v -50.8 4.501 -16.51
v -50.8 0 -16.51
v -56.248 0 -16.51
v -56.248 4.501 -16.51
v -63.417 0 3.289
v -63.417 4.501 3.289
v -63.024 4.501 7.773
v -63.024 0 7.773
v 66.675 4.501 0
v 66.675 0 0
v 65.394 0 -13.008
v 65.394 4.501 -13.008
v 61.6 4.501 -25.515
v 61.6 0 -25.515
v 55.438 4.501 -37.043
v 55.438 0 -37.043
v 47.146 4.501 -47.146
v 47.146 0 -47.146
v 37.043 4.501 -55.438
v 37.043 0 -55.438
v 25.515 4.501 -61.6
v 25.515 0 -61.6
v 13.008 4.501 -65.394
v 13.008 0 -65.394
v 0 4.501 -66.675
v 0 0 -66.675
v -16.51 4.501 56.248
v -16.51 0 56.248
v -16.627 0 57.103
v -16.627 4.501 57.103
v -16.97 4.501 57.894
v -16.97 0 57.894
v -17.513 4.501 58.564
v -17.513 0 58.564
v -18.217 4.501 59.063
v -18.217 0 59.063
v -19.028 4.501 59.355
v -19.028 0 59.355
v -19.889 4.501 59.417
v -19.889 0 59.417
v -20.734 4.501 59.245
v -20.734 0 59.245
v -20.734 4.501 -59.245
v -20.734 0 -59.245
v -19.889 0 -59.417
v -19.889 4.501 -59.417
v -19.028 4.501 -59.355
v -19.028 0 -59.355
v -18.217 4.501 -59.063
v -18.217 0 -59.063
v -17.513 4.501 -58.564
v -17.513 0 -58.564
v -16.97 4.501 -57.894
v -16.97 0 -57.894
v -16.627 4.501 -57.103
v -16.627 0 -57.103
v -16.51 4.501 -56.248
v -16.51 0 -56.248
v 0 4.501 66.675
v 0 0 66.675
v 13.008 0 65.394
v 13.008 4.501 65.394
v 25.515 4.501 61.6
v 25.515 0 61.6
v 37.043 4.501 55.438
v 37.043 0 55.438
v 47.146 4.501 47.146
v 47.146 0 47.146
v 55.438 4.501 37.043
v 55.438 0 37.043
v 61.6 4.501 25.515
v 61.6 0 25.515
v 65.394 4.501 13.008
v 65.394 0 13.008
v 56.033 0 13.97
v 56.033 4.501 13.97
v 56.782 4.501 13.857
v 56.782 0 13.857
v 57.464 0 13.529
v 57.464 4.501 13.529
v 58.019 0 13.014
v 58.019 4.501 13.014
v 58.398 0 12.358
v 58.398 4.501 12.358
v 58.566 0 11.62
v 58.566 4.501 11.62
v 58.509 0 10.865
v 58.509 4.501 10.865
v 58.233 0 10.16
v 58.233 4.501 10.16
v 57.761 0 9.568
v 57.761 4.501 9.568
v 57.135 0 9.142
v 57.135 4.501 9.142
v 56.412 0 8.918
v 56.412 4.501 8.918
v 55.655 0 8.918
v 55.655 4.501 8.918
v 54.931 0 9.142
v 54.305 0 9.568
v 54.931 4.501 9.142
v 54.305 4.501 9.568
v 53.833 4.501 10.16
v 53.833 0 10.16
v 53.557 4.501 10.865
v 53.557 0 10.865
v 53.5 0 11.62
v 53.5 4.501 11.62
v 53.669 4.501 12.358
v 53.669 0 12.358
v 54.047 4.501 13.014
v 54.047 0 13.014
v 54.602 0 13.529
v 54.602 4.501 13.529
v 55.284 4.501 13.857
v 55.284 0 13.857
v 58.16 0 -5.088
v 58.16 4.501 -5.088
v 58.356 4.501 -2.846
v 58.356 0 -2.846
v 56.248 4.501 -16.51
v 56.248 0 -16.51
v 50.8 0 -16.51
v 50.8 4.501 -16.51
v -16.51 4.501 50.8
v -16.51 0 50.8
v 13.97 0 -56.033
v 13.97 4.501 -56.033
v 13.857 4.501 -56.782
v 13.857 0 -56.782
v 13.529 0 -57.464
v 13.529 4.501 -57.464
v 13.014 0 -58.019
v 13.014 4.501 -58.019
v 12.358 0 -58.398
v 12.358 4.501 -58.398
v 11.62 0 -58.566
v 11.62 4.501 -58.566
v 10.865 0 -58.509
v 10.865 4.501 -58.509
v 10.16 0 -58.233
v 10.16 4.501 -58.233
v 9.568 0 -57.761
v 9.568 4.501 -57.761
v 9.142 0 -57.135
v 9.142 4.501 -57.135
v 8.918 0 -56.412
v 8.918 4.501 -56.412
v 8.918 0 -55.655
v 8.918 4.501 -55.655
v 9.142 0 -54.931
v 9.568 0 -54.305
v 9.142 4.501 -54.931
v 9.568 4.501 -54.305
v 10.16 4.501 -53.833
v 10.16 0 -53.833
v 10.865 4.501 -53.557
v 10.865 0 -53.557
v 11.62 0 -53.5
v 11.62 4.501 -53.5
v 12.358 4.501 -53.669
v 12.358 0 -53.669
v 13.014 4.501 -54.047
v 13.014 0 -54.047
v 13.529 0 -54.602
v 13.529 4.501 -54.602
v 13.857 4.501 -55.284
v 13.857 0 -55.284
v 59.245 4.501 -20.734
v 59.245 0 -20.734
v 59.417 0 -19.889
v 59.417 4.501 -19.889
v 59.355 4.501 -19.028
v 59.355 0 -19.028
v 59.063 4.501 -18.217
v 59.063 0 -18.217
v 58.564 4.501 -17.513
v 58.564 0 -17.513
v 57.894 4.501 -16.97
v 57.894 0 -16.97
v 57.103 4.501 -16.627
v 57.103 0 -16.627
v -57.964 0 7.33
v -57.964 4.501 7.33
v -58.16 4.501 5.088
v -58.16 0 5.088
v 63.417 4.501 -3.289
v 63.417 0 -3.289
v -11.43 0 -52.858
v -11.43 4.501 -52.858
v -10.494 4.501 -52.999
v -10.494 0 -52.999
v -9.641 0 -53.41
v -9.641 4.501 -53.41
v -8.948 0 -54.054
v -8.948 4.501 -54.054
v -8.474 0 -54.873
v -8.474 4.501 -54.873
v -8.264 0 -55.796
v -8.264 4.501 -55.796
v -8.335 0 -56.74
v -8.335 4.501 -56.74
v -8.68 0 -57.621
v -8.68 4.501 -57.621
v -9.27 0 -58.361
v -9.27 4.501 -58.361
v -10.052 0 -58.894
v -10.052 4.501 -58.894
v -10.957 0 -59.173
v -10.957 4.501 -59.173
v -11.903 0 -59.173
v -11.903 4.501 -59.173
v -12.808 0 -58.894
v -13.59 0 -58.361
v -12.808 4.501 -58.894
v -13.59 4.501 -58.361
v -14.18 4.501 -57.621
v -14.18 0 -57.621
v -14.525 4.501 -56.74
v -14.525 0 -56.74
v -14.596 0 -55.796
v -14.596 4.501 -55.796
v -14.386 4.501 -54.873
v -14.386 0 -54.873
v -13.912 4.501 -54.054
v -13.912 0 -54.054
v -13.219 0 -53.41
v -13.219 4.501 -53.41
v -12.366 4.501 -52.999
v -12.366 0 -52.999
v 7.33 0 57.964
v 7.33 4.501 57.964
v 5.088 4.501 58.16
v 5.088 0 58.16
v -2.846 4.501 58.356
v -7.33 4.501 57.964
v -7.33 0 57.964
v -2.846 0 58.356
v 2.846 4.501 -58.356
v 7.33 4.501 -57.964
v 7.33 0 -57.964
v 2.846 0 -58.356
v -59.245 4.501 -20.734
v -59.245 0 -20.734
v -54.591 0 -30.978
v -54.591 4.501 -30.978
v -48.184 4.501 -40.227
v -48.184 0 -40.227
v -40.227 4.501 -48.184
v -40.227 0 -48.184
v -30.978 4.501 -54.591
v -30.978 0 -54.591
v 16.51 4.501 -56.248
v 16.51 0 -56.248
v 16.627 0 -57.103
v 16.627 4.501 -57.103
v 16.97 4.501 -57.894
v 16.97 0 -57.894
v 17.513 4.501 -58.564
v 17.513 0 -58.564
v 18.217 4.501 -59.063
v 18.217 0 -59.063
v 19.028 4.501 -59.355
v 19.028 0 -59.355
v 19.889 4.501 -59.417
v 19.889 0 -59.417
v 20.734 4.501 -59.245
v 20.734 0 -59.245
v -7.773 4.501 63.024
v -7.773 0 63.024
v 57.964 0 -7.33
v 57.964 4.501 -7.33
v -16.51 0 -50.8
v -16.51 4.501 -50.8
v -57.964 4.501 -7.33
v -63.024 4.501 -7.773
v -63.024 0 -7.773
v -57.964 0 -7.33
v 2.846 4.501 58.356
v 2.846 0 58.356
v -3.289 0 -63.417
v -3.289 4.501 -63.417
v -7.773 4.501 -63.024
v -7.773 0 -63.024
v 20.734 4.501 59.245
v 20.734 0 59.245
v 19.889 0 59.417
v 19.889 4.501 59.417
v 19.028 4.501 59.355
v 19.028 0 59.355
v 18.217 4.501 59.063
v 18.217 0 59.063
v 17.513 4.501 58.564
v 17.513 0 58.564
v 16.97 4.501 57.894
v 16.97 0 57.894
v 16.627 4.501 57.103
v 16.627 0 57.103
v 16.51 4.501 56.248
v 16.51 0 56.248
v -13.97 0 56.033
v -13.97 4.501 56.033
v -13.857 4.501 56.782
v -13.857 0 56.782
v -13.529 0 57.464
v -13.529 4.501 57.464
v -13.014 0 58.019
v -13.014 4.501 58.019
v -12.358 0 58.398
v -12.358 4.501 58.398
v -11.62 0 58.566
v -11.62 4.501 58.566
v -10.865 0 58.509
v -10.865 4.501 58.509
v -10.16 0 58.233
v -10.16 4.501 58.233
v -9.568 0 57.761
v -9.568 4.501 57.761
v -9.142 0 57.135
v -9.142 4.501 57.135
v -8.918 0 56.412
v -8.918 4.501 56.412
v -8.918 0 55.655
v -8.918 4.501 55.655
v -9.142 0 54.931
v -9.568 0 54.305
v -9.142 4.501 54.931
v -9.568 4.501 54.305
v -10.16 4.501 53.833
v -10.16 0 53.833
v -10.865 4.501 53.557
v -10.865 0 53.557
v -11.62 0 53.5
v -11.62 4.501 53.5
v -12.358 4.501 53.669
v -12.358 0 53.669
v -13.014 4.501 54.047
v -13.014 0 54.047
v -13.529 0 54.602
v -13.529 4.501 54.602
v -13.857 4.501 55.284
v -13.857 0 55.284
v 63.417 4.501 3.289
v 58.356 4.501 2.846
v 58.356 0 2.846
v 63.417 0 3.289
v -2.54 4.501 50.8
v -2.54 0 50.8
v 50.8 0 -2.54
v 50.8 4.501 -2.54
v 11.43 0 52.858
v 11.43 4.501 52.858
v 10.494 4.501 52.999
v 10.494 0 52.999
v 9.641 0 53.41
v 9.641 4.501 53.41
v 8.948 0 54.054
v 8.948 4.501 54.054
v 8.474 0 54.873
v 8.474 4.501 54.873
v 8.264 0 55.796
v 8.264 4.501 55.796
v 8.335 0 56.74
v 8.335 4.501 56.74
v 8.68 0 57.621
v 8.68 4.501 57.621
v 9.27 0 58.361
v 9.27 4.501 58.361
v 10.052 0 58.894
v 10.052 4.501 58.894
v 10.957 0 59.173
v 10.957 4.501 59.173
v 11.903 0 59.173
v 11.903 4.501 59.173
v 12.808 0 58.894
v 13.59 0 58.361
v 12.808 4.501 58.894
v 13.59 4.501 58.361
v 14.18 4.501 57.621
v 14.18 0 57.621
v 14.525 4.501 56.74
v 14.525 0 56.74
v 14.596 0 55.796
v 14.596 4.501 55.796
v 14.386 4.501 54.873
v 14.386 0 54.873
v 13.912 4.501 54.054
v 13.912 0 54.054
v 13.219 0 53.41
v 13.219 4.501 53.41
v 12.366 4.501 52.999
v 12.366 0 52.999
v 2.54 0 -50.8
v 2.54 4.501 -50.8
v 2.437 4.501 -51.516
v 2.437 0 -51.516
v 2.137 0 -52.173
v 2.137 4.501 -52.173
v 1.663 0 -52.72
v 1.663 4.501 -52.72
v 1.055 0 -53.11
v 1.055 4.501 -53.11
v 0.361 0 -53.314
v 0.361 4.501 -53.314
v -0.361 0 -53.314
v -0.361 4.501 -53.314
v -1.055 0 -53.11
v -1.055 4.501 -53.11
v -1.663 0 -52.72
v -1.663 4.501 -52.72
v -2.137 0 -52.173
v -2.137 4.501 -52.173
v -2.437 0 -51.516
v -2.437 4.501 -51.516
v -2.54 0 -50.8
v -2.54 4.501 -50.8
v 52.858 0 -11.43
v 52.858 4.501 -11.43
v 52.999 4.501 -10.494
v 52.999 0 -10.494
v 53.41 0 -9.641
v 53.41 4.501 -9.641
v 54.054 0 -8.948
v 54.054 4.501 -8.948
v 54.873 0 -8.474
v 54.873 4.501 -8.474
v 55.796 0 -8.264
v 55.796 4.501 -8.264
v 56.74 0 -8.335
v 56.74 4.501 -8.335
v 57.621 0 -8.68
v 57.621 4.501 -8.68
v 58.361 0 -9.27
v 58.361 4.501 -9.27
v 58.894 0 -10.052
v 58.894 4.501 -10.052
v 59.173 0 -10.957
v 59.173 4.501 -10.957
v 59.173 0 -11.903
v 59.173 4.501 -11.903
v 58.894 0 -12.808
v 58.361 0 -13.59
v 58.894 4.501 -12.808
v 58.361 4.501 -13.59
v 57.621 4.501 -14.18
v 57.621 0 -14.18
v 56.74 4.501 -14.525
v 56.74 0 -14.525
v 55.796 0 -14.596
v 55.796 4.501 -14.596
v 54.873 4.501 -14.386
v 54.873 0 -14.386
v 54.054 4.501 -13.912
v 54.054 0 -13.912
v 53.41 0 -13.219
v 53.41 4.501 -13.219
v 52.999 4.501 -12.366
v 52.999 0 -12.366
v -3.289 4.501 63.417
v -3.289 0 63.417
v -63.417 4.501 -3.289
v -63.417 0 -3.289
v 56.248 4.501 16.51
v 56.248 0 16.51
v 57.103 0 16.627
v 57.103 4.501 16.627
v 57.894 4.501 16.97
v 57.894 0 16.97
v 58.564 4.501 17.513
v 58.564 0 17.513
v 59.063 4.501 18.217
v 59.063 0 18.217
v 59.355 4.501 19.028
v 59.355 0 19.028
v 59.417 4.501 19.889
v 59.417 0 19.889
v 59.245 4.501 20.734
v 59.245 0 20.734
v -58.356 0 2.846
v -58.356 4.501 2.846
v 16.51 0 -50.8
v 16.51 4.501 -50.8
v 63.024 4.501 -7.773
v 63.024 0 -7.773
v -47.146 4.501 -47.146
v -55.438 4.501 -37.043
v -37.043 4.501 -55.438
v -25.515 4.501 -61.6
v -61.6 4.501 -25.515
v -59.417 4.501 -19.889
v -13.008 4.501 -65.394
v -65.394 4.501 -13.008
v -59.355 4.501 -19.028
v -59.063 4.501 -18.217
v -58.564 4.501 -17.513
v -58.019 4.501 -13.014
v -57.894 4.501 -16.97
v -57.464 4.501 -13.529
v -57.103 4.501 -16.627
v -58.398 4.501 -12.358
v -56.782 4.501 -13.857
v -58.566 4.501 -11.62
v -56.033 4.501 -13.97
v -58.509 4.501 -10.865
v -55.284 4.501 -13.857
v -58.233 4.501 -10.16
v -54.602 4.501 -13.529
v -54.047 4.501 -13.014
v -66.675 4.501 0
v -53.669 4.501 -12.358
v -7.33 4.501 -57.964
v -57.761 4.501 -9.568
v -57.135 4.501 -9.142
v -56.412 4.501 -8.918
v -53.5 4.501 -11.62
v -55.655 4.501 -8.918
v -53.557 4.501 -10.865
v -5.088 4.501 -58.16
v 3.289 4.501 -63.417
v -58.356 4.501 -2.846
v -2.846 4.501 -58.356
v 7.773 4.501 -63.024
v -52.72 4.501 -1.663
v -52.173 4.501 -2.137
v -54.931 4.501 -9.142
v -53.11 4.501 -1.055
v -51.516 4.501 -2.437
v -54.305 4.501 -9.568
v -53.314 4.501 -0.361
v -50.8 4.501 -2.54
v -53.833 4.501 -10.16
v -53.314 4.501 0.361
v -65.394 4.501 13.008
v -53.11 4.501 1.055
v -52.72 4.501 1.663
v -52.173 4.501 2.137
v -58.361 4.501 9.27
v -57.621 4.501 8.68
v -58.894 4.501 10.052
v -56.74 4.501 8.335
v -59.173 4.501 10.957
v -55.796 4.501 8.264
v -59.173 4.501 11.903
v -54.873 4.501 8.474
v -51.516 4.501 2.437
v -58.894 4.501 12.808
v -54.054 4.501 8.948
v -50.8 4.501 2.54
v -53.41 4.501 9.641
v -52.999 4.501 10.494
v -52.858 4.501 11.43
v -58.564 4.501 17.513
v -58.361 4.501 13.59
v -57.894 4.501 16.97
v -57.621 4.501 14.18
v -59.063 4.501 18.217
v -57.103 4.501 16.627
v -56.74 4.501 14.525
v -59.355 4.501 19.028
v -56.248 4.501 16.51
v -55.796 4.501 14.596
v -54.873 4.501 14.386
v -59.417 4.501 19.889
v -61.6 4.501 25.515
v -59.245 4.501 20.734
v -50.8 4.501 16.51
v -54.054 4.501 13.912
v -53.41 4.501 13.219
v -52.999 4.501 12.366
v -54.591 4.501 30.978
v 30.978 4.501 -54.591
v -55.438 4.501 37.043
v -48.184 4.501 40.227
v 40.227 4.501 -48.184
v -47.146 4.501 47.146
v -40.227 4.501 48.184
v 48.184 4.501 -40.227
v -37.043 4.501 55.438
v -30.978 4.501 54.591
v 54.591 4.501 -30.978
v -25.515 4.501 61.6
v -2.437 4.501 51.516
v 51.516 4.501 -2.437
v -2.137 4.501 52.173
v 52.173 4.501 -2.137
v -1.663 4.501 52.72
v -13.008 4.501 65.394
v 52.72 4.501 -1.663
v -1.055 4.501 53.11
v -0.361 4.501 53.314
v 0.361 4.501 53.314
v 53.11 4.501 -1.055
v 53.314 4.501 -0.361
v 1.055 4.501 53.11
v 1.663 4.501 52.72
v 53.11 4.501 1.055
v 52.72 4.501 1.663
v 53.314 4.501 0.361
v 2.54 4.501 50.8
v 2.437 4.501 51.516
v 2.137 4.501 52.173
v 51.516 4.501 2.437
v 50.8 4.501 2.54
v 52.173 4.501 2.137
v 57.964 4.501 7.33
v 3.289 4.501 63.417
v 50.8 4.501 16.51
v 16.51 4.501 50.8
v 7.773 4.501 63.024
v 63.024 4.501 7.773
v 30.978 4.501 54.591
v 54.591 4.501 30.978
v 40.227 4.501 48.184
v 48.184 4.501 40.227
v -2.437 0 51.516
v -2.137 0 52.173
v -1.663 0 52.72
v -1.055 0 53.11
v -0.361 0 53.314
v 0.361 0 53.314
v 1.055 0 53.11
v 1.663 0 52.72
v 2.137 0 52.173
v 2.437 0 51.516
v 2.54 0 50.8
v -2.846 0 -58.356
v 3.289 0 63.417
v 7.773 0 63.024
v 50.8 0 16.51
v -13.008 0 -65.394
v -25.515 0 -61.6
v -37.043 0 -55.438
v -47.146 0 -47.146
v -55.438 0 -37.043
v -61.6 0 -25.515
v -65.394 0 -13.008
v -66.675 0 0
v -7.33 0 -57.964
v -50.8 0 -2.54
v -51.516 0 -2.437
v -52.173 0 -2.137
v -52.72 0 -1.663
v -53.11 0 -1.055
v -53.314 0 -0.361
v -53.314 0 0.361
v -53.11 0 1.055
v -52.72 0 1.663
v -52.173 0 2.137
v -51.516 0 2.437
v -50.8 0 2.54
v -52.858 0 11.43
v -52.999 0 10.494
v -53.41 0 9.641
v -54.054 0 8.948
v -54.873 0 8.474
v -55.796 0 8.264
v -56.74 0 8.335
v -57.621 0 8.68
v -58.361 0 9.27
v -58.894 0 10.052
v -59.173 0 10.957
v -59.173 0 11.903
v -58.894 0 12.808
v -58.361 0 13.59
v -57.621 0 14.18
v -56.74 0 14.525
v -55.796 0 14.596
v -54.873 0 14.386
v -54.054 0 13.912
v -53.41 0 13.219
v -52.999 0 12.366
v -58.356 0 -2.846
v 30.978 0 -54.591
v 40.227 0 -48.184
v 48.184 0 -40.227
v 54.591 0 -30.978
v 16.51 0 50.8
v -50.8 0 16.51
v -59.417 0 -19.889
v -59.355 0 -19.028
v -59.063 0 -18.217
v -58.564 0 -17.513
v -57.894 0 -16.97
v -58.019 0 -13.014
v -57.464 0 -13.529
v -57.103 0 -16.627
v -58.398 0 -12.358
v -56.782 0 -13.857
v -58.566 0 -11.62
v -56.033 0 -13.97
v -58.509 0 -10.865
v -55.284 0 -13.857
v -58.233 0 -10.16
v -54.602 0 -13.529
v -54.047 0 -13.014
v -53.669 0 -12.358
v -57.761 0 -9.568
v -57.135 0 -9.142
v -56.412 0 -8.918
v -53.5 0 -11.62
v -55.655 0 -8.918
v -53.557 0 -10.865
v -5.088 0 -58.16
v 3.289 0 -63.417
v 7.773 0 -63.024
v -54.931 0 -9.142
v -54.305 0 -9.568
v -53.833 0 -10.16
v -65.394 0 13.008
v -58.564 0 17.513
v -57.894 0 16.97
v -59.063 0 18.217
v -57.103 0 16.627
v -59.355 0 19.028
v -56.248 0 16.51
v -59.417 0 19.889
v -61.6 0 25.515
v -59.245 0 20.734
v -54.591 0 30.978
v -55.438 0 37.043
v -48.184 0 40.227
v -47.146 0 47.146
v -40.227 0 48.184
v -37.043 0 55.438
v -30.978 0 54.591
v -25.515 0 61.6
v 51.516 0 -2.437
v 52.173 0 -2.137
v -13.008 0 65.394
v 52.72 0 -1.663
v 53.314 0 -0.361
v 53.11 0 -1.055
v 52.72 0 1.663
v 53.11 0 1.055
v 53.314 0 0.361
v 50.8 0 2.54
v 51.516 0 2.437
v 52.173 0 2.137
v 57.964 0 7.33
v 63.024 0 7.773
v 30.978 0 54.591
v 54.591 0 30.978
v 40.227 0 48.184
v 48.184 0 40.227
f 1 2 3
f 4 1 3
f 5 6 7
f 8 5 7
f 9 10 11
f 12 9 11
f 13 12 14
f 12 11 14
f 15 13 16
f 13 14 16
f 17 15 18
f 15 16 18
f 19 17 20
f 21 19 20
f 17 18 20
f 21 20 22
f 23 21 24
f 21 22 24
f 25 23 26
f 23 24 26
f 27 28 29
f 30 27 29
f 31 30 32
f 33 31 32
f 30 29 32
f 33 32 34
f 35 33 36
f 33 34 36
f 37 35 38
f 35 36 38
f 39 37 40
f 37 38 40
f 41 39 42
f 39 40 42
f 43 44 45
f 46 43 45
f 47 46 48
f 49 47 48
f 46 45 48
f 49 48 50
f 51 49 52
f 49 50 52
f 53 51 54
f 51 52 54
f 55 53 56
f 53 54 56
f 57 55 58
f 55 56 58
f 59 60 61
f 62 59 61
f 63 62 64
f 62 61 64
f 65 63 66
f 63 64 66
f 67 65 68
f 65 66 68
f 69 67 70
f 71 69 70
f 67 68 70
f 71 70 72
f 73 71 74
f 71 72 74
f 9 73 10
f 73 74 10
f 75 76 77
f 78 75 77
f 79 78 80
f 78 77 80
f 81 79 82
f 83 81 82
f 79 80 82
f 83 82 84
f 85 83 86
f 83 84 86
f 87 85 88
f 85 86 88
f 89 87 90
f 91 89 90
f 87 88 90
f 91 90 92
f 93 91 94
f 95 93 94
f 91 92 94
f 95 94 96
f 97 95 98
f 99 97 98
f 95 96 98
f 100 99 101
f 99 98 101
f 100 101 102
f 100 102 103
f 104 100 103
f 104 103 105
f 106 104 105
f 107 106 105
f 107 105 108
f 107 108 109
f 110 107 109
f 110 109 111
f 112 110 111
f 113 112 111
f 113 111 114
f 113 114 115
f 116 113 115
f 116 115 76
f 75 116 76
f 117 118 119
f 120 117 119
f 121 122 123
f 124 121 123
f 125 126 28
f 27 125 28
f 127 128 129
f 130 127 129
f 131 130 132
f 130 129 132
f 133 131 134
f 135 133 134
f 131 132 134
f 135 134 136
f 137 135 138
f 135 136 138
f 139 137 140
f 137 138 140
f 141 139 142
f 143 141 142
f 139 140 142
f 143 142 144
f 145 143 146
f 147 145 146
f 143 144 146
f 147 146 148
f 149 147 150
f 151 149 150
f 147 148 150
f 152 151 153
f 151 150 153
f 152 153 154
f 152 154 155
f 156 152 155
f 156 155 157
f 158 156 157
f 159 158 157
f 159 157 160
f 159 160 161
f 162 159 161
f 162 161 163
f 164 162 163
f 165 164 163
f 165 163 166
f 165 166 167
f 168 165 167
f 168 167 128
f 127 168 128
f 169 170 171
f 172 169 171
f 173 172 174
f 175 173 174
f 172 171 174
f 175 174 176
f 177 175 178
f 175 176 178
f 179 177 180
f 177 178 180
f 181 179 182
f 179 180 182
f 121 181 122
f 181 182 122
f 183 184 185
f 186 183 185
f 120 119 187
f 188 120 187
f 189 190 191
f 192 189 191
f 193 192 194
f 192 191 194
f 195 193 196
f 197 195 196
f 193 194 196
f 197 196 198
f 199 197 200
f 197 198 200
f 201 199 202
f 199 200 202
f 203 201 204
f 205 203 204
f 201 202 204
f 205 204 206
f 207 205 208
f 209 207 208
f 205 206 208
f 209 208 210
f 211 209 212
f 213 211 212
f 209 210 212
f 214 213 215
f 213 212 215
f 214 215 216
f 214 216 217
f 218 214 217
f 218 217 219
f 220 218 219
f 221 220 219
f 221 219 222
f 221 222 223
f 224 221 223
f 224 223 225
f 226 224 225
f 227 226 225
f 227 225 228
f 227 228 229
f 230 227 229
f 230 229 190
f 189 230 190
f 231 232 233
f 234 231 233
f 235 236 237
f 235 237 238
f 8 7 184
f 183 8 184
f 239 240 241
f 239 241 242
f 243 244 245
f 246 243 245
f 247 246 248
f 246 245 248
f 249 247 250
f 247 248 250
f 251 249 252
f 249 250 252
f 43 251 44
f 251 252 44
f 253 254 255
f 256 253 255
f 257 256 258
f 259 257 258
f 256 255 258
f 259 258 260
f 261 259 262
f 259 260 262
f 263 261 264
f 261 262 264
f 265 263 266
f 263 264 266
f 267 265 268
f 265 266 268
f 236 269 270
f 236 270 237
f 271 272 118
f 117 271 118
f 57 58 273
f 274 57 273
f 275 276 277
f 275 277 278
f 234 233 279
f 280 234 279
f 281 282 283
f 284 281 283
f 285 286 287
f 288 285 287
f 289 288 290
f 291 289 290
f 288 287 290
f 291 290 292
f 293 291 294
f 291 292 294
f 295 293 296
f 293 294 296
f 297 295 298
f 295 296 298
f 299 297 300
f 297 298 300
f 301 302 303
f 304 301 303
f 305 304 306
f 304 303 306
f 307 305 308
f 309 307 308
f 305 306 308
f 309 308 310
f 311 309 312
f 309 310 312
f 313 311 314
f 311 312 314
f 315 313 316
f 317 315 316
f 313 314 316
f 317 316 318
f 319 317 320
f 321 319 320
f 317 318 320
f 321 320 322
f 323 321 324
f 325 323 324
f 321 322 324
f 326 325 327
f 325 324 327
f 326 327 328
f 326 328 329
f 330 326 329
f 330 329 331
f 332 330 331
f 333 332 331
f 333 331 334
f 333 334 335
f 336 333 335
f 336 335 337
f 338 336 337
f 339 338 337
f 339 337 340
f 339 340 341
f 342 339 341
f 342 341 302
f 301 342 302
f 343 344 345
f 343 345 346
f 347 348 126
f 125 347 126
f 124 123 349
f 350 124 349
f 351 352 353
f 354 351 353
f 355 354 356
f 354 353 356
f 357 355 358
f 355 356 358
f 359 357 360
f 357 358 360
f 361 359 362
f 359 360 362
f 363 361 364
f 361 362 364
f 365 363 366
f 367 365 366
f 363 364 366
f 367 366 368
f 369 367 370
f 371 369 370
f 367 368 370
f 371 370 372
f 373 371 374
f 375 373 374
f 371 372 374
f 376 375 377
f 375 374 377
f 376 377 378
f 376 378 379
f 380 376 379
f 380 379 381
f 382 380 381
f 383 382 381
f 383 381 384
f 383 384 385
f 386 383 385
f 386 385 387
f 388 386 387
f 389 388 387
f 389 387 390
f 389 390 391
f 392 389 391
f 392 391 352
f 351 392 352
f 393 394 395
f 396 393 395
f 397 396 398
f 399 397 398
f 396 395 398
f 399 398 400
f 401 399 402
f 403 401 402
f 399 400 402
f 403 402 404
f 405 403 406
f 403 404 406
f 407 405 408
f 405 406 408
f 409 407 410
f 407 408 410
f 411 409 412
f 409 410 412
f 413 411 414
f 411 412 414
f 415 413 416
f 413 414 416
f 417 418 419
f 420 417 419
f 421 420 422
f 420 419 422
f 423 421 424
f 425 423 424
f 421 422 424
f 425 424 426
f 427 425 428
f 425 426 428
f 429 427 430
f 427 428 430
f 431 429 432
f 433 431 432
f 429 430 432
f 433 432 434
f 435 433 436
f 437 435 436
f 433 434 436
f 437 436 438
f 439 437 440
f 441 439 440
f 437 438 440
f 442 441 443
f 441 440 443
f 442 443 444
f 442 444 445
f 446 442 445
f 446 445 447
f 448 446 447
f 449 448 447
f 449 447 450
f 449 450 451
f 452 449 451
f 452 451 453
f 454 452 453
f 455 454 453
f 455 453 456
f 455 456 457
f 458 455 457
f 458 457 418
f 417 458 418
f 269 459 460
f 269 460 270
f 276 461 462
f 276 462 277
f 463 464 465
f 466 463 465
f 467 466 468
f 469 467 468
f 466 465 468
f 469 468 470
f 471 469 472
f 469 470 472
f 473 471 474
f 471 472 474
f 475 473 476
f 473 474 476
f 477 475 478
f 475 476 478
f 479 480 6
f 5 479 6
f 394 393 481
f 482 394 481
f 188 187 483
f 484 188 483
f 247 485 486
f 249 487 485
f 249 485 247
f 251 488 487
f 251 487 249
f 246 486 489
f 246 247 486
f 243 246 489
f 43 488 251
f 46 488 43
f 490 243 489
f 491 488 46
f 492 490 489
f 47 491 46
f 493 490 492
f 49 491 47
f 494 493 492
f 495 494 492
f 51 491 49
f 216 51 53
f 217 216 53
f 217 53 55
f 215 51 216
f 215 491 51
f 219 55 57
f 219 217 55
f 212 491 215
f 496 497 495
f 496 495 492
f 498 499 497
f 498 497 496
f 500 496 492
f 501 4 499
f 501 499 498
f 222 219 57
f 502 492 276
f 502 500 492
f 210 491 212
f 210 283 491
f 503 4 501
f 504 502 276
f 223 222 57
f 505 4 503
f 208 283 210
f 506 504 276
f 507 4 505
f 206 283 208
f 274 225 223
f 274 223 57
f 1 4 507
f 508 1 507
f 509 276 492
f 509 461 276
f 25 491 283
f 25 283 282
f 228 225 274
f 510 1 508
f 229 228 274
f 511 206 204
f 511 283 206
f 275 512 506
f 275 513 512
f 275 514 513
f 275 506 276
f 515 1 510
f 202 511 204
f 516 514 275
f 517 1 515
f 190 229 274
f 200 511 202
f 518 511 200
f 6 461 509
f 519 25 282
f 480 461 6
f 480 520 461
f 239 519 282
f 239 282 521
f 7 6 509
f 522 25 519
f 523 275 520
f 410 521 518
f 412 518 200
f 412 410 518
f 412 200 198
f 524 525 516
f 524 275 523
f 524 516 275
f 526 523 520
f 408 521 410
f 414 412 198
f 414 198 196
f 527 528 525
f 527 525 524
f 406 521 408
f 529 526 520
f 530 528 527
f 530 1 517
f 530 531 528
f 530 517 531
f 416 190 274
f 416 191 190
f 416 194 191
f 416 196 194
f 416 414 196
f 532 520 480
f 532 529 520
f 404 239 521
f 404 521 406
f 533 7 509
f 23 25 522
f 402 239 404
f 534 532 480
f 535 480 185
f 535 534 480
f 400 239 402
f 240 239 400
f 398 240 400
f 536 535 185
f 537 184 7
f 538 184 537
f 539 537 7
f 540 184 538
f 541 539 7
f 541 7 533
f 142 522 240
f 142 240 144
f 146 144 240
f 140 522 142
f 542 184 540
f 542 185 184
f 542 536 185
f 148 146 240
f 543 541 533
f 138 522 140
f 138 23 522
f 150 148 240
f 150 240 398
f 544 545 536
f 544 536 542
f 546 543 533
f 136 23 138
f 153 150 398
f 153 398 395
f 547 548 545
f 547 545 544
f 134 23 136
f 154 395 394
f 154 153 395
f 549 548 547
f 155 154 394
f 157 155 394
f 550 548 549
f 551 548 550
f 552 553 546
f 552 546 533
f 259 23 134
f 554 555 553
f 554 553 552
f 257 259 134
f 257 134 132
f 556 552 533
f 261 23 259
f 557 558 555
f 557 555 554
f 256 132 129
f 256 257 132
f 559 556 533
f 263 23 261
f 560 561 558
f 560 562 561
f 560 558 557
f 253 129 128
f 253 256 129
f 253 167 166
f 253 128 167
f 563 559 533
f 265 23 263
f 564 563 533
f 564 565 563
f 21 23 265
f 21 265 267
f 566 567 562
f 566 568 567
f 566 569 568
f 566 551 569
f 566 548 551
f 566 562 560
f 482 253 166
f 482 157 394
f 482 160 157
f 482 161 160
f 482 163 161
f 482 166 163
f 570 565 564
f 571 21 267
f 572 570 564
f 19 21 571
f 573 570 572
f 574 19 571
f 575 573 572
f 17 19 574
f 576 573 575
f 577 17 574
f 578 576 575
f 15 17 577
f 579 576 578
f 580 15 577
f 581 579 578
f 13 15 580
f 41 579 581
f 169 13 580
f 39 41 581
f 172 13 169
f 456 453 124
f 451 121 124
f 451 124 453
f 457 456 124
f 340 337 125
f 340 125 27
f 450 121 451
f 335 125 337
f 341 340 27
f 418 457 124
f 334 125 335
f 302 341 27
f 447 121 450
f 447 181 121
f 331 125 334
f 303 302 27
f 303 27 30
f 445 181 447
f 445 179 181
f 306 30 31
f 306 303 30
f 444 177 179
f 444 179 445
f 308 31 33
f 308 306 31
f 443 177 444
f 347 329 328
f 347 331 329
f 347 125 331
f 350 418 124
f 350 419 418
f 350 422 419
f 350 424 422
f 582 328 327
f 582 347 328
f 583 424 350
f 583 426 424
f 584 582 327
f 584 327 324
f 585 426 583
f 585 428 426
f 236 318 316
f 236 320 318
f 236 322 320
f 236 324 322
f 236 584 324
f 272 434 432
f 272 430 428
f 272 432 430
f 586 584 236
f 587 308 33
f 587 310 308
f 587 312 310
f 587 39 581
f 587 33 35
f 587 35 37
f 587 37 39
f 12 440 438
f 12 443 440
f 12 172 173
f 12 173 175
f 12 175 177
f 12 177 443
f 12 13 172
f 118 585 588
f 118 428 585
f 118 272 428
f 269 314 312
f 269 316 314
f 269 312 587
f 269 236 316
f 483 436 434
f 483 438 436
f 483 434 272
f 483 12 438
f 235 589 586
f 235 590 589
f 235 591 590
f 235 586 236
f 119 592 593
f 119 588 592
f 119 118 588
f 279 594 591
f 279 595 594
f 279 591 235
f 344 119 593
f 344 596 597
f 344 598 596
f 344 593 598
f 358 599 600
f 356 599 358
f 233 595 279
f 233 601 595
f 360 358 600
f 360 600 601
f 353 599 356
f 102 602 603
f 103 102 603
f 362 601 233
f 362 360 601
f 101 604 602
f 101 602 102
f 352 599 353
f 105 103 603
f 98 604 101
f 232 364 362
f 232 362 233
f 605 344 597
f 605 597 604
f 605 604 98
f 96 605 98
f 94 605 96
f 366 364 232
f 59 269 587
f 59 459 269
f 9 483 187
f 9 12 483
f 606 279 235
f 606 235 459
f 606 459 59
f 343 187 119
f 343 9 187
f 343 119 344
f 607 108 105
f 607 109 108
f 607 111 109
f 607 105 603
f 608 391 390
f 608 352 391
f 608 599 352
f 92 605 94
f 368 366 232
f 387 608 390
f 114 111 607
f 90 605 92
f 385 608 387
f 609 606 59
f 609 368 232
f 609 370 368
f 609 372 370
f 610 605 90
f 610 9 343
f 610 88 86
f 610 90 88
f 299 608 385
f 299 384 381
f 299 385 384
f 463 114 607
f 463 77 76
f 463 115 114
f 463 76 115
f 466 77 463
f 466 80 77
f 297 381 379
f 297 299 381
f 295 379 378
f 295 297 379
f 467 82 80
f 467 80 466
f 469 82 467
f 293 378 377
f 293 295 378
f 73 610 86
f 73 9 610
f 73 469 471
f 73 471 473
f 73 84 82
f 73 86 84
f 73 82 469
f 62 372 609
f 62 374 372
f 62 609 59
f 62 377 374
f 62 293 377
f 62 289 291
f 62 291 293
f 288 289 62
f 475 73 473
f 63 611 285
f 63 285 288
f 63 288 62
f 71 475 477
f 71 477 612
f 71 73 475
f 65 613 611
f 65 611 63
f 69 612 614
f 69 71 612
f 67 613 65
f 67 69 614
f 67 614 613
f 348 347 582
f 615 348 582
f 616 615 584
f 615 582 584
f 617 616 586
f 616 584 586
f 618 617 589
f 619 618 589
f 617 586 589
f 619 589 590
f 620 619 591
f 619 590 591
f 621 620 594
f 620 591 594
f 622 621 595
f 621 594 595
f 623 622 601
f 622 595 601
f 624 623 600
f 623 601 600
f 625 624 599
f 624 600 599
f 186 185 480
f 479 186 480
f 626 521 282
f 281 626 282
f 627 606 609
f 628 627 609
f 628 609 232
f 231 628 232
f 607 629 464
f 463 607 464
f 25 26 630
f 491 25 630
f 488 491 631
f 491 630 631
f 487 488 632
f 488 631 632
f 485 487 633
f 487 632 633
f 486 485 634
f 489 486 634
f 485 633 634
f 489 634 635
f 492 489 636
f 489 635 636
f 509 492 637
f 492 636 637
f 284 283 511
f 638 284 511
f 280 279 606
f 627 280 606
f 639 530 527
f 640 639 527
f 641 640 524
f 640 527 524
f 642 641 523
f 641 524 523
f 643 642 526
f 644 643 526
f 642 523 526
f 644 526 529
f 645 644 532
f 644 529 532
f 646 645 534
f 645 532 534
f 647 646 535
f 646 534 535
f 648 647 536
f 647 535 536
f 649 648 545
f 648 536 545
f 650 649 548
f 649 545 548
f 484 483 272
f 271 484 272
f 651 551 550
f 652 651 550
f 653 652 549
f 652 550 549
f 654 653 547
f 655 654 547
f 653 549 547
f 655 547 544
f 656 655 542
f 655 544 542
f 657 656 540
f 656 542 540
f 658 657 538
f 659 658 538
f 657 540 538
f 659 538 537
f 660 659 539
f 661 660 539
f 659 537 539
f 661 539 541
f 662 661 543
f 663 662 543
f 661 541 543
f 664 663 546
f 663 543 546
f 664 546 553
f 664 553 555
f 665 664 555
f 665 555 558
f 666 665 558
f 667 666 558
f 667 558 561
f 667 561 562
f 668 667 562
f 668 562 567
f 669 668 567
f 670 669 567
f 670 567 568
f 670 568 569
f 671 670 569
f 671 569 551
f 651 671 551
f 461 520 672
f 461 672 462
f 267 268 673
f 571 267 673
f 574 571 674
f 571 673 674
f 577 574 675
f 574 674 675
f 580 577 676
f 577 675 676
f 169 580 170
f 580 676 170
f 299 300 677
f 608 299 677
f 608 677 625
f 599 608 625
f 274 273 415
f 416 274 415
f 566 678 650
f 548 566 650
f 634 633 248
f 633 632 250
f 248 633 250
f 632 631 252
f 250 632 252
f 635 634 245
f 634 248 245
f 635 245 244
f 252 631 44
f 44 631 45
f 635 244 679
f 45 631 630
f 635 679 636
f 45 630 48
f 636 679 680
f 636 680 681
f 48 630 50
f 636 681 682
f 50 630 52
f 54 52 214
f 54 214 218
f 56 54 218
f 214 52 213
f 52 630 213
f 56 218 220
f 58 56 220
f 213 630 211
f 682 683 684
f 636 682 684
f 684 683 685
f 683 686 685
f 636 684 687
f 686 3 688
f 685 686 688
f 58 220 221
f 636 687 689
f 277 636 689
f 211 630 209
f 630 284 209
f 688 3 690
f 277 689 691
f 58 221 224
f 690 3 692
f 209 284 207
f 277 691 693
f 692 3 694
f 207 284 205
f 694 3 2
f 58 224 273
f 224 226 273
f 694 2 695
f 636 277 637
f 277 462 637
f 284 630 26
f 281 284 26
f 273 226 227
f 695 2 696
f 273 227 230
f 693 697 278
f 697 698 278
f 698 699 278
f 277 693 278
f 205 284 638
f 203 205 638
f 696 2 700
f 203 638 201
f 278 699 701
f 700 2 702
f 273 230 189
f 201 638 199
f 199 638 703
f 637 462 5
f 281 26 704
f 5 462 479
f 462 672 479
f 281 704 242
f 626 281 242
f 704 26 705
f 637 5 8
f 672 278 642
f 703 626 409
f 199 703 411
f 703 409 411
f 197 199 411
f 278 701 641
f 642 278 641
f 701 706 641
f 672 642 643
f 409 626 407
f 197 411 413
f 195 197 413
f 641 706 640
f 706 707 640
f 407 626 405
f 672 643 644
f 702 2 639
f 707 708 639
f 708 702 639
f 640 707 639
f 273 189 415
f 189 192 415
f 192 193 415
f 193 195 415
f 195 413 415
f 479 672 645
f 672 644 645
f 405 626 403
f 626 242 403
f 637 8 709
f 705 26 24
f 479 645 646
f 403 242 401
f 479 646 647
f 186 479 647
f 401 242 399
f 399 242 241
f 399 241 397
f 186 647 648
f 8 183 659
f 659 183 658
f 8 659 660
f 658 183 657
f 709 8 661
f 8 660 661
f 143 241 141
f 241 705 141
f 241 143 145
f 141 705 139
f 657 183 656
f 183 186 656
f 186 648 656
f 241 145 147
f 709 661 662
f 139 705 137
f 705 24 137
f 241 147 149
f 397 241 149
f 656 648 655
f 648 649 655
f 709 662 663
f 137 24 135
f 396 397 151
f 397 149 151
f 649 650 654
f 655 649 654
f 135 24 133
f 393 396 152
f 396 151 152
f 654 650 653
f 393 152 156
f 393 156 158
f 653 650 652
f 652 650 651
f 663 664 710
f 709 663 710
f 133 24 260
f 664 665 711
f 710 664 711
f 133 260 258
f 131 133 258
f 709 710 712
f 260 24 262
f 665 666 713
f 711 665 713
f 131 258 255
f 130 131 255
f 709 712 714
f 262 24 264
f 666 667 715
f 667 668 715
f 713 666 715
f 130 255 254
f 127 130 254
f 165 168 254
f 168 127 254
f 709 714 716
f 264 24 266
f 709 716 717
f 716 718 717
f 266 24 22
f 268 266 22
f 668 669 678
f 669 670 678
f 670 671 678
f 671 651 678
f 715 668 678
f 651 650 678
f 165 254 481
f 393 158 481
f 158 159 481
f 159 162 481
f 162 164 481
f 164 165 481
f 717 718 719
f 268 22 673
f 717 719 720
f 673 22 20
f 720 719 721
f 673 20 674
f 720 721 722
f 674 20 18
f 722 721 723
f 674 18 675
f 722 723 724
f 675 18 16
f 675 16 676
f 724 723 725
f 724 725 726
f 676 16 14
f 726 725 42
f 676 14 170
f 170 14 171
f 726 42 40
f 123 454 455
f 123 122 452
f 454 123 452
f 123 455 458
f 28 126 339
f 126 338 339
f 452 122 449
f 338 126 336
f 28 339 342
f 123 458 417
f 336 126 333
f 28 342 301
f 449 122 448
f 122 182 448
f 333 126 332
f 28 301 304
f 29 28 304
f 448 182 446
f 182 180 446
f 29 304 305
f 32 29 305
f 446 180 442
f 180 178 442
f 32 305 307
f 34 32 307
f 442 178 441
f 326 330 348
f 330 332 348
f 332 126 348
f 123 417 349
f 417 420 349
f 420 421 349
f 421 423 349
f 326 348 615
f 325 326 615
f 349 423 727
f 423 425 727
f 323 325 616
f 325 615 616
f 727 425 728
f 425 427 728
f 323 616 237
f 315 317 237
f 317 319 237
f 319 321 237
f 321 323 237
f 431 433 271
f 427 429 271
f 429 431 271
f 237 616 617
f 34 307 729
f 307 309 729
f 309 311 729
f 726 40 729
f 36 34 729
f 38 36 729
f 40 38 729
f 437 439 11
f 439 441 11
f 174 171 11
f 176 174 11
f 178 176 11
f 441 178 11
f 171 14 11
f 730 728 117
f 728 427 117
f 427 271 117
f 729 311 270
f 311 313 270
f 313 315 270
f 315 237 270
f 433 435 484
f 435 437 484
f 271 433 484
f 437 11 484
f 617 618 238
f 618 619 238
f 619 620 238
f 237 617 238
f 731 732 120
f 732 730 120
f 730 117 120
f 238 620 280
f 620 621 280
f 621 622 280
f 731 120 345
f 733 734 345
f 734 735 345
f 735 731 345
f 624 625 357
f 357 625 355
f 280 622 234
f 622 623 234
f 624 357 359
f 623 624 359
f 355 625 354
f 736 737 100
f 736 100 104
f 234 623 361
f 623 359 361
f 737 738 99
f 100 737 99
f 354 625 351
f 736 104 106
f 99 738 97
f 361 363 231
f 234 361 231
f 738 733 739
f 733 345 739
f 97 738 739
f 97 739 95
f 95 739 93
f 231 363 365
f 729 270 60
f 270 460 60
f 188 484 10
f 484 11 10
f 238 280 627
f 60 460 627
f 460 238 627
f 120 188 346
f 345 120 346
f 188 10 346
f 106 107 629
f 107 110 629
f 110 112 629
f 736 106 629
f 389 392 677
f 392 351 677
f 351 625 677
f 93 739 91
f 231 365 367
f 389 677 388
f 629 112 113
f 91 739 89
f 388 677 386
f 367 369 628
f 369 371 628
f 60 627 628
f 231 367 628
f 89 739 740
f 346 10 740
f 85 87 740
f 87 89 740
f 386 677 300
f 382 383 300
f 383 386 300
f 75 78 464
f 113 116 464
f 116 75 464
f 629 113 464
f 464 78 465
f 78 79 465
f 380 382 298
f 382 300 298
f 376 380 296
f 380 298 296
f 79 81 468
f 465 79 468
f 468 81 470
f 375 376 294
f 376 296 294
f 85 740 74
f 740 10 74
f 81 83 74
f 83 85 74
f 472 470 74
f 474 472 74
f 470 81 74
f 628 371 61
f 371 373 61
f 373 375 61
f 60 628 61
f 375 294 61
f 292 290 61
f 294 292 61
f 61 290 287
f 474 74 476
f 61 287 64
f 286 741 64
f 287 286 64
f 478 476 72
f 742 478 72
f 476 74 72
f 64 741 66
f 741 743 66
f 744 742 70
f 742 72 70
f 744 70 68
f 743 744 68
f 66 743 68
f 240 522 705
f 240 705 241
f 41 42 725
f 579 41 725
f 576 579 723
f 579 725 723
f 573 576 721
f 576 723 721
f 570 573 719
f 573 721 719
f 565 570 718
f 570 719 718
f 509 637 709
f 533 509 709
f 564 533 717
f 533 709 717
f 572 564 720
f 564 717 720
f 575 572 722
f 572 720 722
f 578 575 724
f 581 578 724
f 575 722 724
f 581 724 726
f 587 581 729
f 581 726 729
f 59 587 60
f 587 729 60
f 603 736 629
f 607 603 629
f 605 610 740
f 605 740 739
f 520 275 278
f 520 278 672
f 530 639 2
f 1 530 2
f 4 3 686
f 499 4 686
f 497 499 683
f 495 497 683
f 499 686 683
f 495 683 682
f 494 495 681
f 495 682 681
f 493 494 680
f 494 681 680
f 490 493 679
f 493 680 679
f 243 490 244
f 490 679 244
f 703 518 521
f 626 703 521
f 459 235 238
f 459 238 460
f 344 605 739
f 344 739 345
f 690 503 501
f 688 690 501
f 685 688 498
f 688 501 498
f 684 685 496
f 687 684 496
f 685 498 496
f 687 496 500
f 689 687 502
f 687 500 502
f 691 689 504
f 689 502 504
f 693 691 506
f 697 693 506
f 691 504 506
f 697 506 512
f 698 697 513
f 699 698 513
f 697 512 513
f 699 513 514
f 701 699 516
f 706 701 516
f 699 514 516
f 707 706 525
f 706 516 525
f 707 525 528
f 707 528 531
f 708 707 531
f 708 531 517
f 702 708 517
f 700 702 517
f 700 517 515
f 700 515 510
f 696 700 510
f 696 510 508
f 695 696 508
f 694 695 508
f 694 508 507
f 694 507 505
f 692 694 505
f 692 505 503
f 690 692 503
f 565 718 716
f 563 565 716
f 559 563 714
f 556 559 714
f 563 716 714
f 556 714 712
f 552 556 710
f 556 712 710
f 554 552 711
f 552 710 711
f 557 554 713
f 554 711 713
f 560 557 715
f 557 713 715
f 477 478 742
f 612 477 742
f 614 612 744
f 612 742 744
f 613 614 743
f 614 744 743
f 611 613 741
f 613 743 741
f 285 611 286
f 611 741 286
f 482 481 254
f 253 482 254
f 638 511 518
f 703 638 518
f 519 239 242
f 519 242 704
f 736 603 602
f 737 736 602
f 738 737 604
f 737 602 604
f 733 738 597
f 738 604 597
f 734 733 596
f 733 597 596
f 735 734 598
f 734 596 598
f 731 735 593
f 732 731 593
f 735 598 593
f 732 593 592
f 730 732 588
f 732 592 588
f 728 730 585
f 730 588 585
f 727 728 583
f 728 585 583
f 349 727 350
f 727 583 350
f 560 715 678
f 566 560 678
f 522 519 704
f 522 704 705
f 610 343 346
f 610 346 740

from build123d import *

# Parameters (mm, degrees)
BOSS_EXTRUDE1_DEPTH = 4.50088
CUT_EXTRUDE1_DEPTH  = 4.50088
CIRPATTERN1_COUNT   = 4
CUT_EXTRUDE3_DEPTH  = 5.50088
CIRPATTERN2_COUNT   = 4
SKETCH6_R           = 3.175
CUT_EXTRUDE4_DEPTH  = 5.50088
CIRPATTERN3_COUNT   = 4
SKETCH9_R           = 2.54
CUT_EXTRUDE5_DEPTH  = 5.50088
CIRPATTERN4_COUNT   = 4


with BuildPart() as part:
    # Sketch1 → Boss-Extrude1 (new body)
    with BuildSketch(Plane(origin=(0, 0, 0), x_dir=(1, 0, 0), z_dir=(0, 1, 0))):
        with BuildLine():
            Line((-66.675, 0), (-50.8, 0))
            Line((-50.8, 0), (-50.8, 16.51))
            Line((-50.8, 16.51), (-56.248410053, 16.51))
            ThreePointArc((-56.248410053, 16.51), (-58.837856989, 17.84777667), (-59.245192619, 20.733770352))
            ThreePointArc((-59.245192619, 20.733770352), (-44.384017853, 44.384017853), (-20.733770352, 59.245192619))
            ThreePointArc((-20.733770352, 59.245192619), (-17.84777667, 58.837856989), (-16.51, 56.248410053))
            Line((-16.51, 56.248410053), (-16.51, 50.8))
            Line((-16.51, 50.8), (0, 50.8))
            Line((0, 50.8), (0, 66.675))
            ThreePointArc((0, 66.675), (-47.146344636, 47.146344636), (-66.675, 0))
        make_face()
    boss_extrude1 = extrude(amount=BOSS_EXTRUDE1_DEPTH)

    # Sketch2 → Cut-Extrude1 (cut)
    with BuildSketch(Plane(origin=(0, 4.50088, 0), x_dir=(1, 0, 0), z_dir=(0, 1, 0))):
        Polygon((-63.024379444, 7.772955042), (-57.963710378, 7.330203869), (-58.355987918, 2.846451076), (-63.416656984, 3.28920225), align=None)
        Polygon((-7.330203869, 57.963710378), (-5.088327473, 58.159849148), (-5.531078646, 63.220518214), (-7.772955042, 63.024379444), align=None)
        Polygon((-5.531078646, 63.220518214), (-5.088327473, 58.159849148), (-2.846451076, 58.355987918), (-3.28920225, 63.416656984), align=None)
    cut_extrude1 = extrude(amount=-CUT_EXTRUDE1_DEPTH, mode=Mode.SUBTRACT)

    # CirPattern1: Boss-Extrude1, Cut-Extrude1 ×4 about axis
    cirpattern1_axis = Axis((0, 0, 0), (0, 1, 0))
    for i in range(1, CIRPATTERN1_COUNT):
        add(boss_extrude1.rotate(cirpattern1_axis, i * 360 / CIRPATTERN1_COUNT))
        add(cut_extrude1.rotate(cirpattern1_axis, i * 360 / CIRPATTERN1_COUNT), mode=Mode.SUBTRACT)

    # Sketch5 → Cut-Extrude3 (cut, through all)
    with BuildSketch(Plane(origin=(0, 4.50088, 0), x_dir=(1, 0, 0), z_dir=(0, 1, 0))):
        with BuildLine():
            Line((-2.54, 50.8), (2.54, 50.8))
            ThreePointArc((2.54, 50.8), (0, 53.34), (-2.54, 50.8))
        make_face()
    cut_extrude3 = extrude(amount=-CUT_EXTRUDE3_DEPTH, mode=Mode.SUBTRACT)

    # CirPattern2: Cut-Extrude3 ×4 about axis
    cirpattern2_axis = Axis((0, 0, 0), (0, 1, 0))
    for i in range(1, CIRPATTERN2_COUNT):
        add(cut_extrude3.rotate(cirpattern2_axis, i * 360 / CIRPATTERN2_COUNT), mode=Mode.SUBTRACT)

    # Sketch6 → Cut-Extrude4 (cut, through all)
    with BuildSketch(Plane(origin=(0, 4.50088, 0), x_dir=(1, 0, 0), z_dir=(0, 1, 0))):
        with Locations((-56.03313088, -11.43)):
            Circle(SKETCH6_R)
    cut_extrude4 = extrude(amount=-CUT_EXTRUDE4_DEPTH, mode=Mode.SUBTRACT)

    # CirPattern3: Cut-Extrude4 ×4 about axis
    cirpattern3_axis = Axis((0, 0, 0), (0, 1, 0))
    for i in range(1, CIRPATTERN3_COUNT):
        add(cut_extrude4.rotate(cirpattern3_axis, i * 360 / CIRPATTERN3_COUNT), mode=Mode.SUBTRACT)

    # Sketch9 → Cut-Extrude5 (cut, through all)
    with BuildSketch(Plane(origin=(0, 4.50088, 0), x_dir=(1, 0, 0), z_dir=(0, 1, 0))):
        with Locations((11.43, 56.03313088)):
            Circle(SKETCH9_R)
    cut_extrude5 = extrude(amount=-CUT_EXTRUDE5_DEPTH, mode=Mode.SUBTRACT)

    # CirPattern4: Cut-Extrude5 ×4 about axis
    cirpattern4_axis = Axis((0, 0, 0), (0, 1, 0))
    for i in range(1, CIRPATTERN4_COUNT):
        add(cut_extrude5.rotate(cirpattern4_axis, i * 360 / CIRPATTERN4_COUNT), mode=Mode.SUBTRACT)


solid = part.part
